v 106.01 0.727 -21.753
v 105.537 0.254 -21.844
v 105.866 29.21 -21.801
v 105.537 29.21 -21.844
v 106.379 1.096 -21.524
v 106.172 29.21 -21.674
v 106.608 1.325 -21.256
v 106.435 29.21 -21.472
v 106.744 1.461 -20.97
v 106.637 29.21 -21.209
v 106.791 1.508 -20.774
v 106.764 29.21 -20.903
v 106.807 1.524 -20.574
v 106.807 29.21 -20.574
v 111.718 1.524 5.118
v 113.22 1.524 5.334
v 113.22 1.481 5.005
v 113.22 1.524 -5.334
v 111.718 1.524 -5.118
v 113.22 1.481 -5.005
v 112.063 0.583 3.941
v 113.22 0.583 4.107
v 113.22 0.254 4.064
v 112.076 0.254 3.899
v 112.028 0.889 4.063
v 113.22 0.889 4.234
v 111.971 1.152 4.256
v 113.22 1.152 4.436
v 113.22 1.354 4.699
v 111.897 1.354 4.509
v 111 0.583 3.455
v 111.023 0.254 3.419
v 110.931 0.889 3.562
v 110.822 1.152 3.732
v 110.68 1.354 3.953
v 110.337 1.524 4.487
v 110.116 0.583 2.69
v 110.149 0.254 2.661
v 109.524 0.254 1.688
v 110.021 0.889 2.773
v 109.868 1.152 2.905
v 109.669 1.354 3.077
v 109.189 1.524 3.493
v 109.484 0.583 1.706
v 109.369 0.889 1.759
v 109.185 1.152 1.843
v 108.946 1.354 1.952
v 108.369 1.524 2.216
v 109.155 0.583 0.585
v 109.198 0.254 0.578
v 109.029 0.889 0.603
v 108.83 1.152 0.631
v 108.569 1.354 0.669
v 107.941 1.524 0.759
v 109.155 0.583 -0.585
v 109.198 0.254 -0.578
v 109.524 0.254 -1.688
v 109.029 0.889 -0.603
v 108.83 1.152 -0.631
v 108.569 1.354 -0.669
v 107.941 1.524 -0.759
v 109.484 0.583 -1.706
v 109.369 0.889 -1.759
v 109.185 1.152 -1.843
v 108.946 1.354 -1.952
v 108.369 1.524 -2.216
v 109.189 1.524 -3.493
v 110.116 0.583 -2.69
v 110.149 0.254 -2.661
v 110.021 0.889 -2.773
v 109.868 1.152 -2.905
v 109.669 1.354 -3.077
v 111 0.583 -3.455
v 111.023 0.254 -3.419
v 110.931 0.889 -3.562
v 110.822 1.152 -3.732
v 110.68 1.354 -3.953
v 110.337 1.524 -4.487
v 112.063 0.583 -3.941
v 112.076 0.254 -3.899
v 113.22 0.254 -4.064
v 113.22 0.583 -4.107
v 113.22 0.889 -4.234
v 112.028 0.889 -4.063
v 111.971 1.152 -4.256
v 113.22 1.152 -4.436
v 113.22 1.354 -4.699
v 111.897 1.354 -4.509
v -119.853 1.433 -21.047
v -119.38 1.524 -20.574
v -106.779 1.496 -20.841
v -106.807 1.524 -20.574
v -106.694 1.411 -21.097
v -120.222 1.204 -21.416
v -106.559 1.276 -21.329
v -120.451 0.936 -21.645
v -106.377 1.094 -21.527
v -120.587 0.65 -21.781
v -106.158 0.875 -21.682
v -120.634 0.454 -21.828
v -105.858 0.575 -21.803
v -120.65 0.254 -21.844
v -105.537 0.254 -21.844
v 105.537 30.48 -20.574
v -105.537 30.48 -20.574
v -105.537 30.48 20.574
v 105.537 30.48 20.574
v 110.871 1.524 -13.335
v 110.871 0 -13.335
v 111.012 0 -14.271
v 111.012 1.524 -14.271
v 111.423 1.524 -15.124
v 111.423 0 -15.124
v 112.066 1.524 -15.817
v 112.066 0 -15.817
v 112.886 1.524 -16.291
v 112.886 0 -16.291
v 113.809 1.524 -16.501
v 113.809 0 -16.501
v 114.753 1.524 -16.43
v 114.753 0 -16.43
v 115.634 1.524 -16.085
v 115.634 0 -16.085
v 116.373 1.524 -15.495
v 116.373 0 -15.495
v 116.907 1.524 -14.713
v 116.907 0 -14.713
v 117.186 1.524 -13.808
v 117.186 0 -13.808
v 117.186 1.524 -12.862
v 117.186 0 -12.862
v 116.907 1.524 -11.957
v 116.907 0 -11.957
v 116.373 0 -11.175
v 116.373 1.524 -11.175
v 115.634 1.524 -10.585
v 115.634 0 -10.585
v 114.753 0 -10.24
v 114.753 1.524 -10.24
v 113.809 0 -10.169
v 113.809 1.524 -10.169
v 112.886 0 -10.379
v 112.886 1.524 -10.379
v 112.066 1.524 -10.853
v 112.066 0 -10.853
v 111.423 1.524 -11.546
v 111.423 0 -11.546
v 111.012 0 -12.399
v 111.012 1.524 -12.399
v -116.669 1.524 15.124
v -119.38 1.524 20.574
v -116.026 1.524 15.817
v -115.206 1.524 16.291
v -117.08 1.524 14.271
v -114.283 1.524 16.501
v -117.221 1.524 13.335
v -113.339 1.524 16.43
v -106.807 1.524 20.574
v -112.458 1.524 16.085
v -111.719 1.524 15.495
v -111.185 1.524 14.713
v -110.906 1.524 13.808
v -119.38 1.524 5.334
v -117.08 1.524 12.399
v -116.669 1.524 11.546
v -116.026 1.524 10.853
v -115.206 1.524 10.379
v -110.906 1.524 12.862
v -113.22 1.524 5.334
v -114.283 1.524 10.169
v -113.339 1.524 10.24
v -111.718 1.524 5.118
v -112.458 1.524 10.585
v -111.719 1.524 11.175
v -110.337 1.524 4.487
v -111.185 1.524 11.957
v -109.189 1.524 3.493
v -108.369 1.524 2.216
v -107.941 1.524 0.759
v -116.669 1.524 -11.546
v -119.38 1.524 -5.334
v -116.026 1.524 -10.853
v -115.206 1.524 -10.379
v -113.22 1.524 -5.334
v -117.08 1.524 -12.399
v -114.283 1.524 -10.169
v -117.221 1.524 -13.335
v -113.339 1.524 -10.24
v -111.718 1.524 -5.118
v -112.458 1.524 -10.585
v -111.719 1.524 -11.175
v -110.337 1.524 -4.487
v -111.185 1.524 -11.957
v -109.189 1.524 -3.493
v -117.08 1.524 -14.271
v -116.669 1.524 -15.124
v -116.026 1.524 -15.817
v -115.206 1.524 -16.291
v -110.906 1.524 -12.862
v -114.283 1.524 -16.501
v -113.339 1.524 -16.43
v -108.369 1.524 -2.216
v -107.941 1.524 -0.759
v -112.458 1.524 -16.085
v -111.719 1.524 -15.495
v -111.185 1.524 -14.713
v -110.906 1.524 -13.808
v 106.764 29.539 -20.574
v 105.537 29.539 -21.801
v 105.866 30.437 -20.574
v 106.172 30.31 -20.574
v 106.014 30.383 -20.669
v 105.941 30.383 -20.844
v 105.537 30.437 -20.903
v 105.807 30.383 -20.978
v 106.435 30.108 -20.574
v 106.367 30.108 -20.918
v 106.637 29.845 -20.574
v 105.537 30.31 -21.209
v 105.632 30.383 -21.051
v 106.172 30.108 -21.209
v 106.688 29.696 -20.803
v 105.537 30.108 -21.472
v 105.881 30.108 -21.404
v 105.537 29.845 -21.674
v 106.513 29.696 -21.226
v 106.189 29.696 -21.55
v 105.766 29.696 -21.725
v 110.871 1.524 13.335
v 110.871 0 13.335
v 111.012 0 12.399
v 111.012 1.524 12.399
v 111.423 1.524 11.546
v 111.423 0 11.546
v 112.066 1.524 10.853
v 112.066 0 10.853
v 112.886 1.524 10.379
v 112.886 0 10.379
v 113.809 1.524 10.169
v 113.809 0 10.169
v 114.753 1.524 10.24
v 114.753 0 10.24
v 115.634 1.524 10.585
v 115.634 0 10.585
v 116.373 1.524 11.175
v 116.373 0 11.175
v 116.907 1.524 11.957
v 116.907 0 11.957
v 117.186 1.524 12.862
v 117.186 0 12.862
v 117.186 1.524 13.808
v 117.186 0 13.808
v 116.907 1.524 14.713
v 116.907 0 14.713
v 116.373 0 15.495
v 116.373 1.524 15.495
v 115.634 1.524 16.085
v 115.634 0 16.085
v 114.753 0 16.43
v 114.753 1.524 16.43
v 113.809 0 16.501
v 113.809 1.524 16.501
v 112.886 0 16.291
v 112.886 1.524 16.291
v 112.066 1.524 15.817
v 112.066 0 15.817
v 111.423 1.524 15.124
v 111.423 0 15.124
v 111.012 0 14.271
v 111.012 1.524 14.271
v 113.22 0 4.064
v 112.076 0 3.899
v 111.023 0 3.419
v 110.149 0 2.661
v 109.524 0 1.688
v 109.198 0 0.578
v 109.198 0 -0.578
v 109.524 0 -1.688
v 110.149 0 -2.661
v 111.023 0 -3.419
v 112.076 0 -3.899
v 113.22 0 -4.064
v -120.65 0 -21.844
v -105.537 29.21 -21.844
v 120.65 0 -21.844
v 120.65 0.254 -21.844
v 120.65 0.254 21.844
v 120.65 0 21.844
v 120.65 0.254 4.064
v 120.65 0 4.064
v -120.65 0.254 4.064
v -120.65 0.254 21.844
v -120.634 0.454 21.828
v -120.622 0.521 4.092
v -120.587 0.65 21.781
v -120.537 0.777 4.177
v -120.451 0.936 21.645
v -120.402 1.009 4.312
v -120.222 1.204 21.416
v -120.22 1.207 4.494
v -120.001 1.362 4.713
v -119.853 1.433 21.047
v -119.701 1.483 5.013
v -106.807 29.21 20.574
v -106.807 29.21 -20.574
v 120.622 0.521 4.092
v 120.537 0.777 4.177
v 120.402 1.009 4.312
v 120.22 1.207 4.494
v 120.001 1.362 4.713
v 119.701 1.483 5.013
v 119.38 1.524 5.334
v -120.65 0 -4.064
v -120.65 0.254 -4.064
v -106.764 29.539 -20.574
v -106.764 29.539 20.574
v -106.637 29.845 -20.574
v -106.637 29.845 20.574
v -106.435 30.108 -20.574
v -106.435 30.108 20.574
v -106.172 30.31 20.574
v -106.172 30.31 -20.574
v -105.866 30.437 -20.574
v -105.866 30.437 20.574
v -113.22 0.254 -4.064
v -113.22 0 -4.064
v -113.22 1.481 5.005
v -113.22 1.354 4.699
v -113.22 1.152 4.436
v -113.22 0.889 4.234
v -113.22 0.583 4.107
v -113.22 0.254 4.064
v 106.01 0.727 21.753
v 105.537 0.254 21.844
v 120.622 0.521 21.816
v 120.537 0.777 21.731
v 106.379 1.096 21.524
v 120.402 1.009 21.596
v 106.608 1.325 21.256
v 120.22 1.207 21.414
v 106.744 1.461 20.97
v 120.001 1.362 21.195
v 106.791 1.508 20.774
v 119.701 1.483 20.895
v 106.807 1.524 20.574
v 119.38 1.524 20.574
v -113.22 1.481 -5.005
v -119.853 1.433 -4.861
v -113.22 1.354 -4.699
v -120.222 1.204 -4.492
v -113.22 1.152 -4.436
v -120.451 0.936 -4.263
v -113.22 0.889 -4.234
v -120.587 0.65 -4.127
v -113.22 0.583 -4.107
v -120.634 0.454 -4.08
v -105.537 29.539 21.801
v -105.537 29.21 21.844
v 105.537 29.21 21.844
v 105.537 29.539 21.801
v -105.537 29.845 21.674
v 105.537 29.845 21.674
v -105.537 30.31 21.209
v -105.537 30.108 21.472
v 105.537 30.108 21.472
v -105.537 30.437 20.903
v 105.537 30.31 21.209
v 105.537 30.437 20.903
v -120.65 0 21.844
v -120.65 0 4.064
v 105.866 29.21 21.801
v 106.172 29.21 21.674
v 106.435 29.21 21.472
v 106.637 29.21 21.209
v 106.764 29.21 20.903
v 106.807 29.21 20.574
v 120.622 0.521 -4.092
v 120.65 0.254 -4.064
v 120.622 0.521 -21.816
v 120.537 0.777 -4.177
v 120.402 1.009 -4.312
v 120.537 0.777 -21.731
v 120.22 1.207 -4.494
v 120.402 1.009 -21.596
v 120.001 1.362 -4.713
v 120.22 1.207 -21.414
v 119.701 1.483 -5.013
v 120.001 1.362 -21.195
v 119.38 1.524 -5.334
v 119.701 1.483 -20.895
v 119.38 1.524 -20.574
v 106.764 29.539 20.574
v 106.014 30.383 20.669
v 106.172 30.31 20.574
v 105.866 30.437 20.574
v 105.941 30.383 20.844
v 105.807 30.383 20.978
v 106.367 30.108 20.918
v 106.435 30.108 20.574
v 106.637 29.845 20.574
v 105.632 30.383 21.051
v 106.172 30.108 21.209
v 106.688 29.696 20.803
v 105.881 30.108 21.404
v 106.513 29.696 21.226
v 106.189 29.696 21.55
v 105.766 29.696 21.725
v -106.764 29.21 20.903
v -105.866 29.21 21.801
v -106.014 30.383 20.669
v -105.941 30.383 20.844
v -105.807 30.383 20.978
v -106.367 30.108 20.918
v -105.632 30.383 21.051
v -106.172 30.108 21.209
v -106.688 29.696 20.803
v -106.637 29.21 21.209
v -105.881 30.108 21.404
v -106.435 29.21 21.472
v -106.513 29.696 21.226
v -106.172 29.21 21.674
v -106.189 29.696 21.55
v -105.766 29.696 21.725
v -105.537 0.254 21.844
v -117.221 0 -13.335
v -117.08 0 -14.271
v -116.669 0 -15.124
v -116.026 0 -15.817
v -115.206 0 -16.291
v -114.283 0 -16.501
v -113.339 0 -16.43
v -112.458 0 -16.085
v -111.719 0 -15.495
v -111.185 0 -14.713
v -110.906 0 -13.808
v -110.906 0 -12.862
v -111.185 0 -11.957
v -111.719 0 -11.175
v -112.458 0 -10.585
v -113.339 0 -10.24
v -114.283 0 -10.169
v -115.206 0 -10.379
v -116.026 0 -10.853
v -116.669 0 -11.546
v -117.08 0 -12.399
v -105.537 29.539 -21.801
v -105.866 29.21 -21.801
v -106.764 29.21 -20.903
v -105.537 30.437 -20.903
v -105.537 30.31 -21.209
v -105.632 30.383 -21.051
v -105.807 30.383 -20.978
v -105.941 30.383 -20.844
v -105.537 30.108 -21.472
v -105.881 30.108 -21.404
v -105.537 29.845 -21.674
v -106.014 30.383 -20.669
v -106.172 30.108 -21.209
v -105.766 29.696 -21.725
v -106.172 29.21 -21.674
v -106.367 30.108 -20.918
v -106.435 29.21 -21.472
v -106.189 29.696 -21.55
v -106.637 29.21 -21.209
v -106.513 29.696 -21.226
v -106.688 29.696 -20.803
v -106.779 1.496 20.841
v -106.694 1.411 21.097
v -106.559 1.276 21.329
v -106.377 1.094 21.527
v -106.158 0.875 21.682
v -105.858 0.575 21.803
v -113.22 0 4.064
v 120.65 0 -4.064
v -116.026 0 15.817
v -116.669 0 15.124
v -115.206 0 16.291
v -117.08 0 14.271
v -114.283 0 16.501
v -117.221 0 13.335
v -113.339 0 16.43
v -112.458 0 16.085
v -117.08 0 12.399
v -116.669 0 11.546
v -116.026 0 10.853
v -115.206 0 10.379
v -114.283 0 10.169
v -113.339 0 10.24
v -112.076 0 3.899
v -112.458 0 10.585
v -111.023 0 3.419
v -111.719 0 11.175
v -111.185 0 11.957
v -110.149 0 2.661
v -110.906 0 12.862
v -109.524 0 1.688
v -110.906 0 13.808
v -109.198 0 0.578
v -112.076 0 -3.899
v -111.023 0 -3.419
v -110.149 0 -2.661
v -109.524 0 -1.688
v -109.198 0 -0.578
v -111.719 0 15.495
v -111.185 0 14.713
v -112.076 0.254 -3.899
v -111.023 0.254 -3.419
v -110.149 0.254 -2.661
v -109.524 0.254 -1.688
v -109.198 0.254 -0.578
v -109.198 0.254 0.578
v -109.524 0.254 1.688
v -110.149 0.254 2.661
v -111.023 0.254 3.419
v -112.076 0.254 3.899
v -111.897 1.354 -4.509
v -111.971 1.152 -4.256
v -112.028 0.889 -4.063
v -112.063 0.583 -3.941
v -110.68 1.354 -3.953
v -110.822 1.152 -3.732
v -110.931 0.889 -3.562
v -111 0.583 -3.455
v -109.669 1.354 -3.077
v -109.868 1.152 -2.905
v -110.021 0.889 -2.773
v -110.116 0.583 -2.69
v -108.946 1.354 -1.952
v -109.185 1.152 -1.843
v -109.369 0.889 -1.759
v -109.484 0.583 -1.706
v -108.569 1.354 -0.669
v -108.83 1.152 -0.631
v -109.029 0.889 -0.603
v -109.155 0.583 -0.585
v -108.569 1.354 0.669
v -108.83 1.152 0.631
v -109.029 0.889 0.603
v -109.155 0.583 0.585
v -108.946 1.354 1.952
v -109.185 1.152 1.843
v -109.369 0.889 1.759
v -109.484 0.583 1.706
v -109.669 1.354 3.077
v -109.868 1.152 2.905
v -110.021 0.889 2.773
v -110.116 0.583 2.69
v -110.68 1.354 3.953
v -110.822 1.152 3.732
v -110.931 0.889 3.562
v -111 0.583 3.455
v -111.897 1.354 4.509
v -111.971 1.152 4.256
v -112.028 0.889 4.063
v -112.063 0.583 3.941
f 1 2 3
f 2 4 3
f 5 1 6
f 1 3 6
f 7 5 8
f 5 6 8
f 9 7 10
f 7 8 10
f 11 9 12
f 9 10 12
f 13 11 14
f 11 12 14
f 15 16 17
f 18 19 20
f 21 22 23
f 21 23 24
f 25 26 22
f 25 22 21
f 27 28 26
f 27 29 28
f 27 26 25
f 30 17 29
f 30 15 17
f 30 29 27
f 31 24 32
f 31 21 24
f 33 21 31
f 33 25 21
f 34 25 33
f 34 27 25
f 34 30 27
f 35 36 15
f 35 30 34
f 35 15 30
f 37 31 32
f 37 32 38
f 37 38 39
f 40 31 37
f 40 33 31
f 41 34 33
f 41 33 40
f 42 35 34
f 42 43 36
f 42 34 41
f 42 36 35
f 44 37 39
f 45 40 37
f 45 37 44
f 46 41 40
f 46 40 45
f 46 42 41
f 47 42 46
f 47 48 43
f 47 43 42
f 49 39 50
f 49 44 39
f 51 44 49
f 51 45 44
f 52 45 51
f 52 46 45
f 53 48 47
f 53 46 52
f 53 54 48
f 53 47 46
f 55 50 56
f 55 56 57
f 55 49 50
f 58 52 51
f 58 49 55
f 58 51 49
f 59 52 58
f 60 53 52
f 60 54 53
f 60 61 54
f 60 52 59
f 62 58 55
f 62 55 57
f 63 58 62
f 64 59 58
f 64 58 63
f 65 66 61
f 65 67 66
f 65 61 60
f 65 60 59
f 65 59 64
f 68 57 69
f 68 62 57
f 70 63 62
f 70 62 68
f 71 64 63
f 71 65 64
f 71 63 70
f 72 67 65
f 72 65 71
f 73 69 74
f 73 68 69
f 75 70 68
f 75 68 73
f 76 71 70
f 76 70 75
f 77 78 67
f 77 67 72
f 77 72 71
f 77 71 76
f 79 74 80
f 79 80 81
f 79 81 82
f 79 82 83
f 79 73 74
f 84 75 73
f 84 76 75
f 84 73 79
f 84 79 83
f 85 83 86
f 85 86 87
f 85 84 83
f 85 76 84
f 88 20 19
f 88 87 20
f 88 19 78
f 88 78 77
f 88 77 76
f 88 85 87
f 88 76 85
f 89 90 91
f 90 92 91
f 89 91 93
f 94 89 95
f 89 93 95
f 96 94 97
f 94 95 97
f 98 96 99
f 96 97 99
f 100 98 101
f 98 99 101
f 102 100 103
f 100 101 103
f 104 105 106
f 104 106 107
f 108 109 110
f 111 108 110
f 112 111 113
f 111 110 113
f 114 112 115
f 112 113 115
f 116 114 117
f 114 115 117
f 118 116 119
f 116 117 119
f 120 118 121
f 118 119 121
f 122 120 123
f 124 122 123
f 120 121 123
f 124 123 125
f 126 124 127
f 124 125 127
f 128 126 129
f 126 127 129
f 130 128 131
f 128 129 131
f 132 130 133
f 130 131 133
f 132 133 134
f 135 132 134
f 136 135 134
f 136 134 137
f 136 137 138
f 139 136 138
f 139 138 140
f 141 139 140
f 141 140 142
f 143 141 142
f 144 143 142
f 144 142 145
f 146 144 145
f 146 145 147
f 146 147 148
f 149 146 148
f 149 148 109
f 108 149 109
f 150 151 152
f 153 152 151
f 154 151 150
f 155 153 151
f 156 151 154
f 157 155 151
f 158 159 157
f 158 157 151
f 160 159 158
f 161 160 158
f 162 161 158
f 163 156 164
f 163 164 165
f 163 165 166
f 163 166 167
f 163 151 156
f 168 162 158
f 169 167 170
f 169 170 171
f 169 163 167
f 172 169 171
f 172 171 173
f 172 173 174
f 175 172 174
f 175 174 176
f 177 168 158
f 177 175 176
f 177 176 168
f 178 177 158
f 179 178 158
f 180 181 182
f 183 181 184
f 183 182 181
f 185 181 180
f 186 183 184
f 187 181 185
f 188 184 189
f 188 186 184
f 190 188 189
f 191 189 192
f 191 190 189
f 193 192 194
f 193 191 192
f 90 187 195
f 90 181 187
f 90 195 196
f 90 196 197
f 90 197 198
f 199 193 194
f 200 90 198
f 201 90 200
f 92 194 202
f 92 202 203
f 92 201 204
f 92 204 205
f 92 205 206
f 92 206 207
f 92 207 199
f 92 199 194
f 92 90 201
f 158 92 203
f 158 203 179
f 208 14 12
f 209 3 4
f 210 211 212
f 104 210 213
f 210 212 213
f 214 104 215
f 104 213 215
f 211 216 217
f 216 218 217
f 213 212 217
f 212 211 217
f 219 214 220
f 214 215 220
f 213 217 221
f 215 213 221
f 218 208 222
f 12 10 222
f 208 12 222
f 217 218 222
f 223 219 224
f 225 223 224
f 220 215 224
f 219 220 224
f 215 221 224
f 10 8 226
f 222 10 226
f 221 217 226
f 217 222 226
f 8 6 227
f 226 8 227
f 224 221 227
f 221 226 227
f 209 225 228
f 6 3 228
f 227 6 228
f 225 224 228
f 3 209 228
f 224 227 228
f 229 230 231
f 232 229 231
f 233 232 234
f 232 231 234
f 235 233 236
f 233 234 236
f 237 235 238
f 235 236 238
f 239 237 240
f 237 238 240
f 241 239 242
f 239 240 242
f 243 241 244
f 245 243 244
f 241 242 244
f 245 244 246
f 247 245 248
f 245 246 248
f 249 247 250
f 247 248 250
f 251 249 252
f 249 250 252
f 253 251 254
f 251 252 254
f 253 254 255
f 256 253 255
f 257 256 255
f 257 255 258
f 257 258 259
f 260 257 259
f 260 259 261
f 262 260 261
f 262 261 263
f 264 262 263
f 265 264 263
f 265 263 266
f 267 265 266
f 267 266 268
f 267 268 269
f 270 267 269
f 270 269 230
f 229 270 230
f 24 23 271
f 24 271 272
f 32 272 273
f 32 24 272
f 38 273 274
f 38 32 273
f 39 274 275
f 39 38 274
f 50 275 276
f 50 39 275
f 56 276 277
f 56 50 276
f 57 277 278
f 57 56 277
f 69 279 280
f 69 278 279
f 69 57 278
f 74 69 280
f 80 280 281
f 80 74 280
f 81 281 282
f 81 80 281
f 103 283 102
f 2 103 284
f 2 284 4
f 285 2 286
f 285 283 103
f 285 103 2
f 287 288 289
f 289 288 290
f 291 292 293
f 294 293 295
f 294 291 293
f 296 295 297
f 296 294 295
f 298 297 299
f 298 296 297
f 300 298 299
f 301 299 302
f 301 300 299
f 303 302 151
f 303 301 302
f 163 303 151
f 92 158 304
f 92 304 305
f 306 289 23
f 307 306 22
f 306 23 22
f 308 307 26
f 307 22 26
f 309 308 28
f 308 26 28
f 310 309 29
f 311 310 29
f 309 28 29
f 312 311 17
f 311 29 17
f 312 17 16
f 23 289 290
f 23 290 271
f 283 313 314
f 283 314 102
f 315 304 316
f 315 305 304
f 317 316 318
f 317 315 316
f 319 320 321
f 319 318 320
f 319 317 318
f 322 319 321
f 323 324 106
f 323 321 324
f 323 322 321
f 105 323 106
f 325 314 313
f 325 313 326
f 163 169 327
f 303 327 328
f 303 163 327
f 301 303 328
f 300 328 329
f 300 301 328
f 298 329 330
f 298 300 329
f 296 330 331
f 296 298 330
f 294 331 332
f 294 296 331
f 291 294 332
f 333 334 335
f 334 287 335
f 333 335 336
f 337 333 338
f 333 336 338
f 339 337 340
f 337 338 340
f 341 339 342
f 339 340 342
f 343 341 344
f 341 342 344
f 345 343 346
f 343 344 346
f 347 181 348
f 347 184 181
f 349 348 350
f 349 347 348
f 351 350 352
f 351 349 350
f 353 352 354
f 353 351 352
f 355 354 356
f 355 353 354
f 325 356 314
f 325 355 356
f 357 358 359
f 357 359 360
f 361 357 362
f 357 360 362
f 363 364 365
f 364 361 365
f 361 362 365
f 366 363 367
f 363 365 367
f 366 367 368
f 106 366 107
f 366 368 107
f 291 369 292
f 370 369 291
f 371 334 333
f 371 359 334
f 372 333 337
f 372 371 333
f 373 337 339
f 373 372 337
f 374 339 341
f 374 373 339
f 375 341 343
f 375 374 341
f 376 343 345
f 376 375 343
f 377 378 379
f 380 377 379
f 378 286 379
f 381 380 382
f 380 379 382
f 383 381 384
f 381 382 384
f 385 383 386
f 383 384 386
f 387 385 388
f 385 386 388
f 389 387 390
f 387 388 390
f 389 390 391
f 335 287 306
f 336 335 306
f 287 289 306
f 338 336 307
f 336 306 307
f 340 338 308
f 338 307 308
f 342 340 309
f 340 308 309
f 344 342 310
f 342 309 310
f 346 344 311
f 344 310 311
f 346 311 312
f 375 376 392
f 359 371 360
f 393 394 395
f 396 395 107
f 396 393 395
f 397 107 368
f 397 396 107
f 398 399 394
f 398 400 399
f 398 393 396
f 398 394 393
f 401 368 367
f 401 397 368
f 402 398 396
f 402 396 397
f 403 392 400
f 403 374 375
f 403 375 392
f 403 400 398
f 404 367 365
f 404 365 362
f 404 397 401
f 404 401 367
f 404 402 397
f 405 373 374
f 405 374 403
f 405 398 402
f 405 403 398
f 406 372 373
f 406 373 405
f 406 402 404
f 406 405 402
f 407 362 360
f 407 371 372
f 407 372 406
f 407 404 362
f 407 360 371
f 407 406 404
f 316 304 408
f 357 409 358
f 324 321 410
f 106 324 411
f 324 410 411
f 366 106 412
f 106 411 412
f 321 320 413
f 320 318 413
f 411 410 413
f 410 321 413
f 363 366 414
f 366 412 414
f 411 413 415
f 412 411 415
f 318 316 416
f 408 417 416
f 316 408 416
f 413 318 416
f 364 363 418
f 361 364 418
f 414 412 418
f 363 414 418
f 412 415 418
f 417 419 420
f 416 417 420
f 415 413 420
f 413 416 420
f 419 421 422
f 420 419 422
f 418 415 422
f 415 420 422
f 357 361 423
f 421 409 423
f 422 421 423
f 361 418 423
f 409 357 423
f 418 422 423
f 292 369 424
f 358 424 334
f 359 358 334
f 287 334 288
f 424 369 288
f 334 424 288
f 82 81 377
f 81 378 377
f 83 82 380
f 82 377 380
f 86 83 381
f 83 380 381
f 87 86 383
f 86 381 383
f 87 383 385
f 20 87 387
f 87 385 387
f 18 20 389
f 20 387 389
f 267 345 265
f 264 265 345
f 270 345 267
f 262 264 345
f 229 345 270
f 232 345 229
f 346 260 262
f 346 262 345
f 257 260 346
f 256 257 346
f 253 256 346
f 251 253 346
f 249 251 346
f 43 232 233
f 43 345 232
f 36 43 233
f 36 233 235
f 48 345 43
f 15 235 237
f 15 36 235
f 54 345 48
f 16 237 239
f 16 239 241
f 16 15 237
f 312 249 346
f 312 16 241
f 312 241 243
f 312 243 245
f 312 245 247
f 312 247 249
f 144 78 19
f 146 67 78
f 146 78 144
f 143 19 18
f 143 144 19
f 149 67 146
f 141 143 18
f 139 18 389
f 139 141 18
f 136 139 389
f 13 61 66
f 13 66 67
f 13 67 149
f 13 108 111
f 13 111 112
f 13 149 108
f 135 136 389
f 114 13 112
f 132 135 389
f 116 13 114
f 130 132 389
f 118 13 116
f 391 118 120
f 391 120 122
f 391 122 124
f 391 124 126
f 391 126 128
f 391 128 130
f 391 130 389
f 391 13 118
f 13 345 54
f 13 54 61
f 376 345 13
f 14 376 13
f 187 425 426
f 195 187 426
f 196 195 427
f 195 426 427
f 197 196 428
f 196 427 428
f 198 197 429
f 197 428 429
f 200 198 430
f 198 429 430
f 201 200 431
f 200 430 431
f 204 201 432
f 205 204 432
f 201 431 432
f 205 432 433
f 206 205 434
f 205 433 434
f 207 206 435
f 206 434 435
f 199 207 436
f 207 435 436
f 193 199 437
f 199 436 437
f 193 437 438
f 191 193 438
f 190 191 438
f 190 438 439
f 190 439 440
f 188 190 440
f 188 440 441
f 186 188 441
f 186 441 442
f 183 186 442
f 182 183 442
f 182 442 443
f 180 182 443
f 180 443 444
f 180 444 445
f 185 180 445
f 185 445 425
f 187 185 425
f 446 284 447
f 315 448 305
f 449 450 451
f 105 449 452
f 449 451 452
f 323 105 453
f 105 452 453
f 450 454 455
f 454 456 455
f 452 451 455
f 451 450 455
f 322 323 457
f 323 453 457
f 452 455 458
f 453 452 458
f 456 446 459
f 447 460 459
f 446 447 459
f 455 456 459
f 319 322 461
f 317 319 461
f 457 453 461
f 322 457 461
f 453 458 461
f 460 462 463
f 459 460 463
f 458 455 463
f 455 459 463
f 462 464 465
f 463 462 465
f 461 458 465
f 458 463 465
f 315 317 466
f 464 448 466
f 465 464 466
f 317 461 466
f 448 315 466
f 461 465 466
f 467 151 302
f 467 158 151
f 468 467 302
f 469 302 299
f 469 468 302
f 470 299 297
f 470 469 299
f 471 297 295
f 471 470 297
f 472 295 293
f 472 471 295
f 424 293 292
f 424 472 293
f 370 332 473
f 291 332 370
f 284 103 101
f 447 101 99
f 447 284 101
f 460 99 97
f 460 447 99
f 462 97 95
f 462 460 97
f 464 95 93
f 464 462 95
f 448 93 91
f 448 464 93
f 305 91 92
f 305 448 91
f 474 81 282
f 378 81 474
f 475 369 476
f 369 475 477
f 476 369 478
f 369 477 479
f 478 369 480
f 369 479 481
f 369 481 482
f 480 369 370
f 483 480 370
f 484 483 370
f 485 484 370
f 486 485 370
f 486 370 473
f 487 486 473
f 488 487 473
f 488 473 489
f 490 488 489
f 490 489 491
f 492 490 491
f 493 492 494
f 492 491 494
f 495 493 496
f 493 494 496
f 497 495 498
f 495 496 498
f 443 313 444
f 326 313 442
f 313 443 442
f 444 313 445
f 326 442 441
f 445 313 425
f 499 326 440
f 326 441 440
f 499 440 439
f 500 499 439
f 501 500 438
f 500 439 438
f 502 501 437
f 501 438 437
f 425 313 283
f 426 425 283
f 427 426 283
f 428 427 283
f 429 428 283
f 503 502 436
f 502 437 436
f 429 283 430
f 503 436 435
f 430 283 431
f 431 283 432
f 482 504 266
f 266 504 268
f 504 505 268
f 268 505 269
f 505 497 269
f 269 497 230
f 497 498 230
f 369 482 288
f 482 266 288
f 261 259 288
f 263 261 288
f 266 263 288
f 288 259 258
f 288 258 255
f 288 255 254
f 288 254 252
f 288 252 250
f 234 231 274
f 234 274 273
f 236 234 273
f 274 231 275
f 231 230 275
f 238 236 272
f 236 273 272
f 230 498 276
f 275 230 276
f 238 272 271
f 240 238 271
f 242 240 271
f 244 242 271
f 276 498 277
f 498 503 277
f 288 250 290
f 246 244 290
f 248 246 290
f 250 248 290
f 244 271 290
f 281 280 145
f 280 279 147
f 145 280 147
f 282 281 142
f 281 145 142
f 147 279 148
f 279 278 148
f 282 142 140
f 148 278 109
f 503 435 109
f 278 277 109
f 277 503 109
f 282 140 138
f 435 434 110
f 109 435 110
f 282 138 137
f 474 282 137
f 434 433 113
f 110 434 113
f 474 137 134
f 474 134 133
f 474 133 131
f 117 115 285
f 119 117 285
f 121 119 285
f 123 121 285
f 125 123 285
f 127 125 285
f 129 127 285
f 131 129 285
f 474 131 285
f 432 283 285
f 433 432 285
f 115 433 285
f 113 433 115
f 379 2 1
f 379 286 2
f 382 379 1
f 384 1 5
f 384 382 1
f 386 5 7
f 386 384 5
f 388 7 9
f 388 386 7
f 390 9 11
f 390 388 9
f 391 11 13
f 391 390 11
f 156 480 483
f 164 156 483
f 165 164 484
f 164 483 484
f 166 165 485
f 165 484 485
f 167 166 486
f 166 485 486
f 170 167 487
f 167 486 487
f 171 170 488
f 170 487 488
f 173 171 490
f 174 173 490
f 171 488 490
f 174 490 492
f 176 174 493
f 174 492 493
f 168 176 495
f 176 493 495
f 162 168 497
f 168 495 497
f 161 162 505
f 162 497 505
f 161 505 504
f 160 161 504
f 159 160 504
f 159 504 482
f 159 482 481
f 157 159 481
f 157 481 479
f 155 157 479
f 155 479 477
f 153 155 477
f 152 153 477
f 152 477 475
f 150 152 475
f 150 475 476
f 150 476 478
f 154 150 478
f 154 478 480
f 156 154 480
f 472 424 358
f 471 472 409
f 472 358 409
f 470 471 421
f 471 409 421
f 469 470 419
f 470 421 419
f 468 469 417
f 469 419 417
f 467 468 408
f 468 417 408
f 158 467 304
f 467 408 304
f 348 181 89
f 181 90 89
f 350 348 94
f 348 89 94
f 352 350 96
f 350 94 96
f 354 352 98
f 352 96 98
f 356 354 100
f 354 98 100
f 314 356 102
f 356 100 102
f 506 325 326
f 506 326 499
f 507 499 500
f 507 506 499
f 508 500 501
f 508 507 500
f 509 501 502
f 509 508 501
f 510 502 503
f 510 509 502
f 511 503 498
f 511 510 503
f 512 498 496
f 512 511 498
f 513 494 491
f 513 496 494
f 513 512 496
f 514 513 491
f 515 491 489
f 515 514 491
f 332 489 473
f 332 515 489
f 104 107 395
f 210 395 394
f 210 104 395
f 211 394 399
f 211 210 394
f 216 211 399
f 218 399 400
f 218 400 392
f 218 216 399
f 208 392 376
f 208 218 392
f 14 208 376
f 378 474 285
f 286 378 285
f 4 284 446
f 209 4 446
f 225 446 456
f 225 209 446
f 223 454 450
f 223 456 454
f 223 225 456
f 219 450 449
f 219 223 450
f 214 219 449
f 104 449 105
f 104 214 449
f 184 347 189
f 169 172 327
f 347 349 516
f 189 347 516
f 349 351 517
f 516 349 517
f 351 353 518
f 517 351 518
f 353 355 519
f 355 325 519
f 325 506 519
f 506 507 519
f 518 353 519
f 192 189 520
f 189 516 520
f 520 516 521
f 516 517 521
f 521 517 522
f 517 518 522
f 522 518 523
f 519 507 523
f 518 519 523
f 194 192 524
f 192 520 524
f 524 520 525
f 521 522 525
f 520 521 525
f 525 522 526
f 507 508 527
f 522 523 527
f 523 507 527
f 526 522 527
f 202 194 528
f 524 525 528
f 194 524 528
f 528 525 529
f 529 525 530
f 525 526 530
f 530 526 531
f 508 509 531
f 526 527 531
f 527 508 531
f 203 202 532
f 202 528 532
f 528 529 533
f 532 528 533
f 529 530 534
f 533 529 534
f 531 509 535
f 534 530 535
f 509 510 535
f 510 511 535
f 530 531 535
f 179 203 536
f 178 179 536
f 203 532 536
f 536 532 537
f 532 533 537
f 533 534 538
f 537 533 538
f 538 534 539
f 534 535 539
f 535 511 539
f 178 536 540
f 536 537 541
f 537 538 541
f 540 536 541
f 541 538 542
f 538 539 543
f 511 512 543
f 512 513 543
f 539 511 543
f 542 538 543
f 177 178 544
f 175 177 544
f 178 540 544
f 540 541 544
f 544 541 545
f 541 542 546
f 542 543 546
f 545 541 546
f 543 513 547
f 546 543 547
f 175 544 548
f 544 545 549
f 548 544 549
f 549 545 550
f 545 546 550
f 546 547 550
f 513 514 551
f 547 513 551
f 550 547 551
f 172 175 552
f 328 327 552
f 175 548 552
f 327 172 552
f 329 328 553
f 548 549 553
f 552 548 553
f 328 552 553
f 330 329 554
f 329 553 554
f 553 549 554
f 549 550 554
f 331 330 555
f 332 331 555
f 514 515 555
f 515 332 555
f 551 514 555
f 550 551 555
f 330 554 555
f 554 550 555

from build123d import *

# Parameters (mm, degrees)
SKETCH1_W                   = 241.3
SKETCH1_H                   = 43.688
BOSS_EXTRUDE1_DEPTH         = 1.524
F_1_4_0_25_DIAMETER_HOLE1_D = 6.35
CUT_EXTRUDE1_DEPTH          = 2.524
SKETCH5_W                   = 213.614
SKETCH5_H                   = 43.688
BOSS_EXTRUDE2_DEPTH         = 28.956
FILLET2_R                   = 1.27


with BuildPart() as part:
    # Sketch1 → Boss-Extrude1 (new body)
    with BuildSketch(Plane(origin=(0, 0, 0), x_dir=(1, 0, 0), z_dir=(0, 1, 0))):
        Rectangle(SKETCH1_W, SKETCH1_H)
    extrude(amount=BOSS_EXTRUDE1_DEPTH)

    # 1/4 (0.25) Diameter Hole1 (through all)
    with Locations(Plane(origin=(0, 1.524, 0), x_dir=(1, 0, 0), z_dir=(0, 1, 0))):
        with Locations((114.046, -13.335), (-114.046, 13.335), (-114.046, -13.335), (114.046, 13.335)):
            Hole(F_1_4_0_25_DIAMETER_HOLE1_D / 2)

    # Sketch4 → Cut-Extrude1 (cut, through all)
    with BuildSketch(Plane(origin=(0, 1.524, 0), x_dir=(1, 0, 0), z_dir=(0, 1, 0))):
        with BuildLine():
            Line((-120.65, 4.064), (-113.2205, 4.064))
            ThreePointArc((-113.2205, 4.064), (-109.1565, 0), (-113.2205, -4.064))
            Line((-113.2205, -4.064), (-120.65, -4.064))
            Line((-120.65, -4.064), (-120.65, 4.064))
        make_face()
        with BuildLine():
            Line((113.2205, 4.064), (120.65, 4.064))
            Line((120.65, 4.064), (120.65, -4.064))
            Line((120.65, -4.064), (113.2205, -4.064))
            ThreePointArc((113.2205, -4.064), (109.1565, 0), (113.2205, 4.064))
        make_face()
    extrude(amount=-CUT_EXTRUDE1_DEPTH, mode=Mode.SUBTRACT)

    # Sketch5 → Boss-Extrude2 (add)
    with BuildSketch(Plane(origin=(0, 1.524, 0), x_dir=(1, 0, 0), z_dir=(0, 1, 0))):
        Rectangle(SKETCH5_W, SKETCH5_H)
    extrude(amount=BOSS_EXTRUDE2_DEPTH)

    # Fillet2
    fillet2_edges = [part.edges().sort_by_distance(p)[0] for p in [
        (-120.65, 1.524, -12.954),
        (-113.7285, 1.524, 21.844),
        (120.65, 1.524, -12.954),
        (120.65, 1.524, 12.954),
        (116.93525, 1.524, -4.064),
        (109.1565, 1.524, 0),
        (116.93525, 1.524, 4.064),
        (-120.65, 1.524, 12.954),
        (-109.1565, 1.524, 0),
        (-116.93525, 1.524, -4.064),
        (-116.93525, 1.524, 4.064),
        (113.7285, 1.524, 21.844),
        (-113.7285, 1.524, -21.844),
        (106.807, 16.002, 21.844),
        (106.807, 16.002, -21.844),
        (-106.807, 16.002, -21.844),
        (-106.807, 16.002, 21.844),
        (106.807, 30.48, 0),
        (113.7285, 1.524, -21.844),
        (0, 30.48, -21.844),
        (-106.807, 30.48, 0),
        (0, 30.48, 21.844),
    ]]
    fillet(fillet2_edges, radius=FILLET2_R)


solid = part.part
